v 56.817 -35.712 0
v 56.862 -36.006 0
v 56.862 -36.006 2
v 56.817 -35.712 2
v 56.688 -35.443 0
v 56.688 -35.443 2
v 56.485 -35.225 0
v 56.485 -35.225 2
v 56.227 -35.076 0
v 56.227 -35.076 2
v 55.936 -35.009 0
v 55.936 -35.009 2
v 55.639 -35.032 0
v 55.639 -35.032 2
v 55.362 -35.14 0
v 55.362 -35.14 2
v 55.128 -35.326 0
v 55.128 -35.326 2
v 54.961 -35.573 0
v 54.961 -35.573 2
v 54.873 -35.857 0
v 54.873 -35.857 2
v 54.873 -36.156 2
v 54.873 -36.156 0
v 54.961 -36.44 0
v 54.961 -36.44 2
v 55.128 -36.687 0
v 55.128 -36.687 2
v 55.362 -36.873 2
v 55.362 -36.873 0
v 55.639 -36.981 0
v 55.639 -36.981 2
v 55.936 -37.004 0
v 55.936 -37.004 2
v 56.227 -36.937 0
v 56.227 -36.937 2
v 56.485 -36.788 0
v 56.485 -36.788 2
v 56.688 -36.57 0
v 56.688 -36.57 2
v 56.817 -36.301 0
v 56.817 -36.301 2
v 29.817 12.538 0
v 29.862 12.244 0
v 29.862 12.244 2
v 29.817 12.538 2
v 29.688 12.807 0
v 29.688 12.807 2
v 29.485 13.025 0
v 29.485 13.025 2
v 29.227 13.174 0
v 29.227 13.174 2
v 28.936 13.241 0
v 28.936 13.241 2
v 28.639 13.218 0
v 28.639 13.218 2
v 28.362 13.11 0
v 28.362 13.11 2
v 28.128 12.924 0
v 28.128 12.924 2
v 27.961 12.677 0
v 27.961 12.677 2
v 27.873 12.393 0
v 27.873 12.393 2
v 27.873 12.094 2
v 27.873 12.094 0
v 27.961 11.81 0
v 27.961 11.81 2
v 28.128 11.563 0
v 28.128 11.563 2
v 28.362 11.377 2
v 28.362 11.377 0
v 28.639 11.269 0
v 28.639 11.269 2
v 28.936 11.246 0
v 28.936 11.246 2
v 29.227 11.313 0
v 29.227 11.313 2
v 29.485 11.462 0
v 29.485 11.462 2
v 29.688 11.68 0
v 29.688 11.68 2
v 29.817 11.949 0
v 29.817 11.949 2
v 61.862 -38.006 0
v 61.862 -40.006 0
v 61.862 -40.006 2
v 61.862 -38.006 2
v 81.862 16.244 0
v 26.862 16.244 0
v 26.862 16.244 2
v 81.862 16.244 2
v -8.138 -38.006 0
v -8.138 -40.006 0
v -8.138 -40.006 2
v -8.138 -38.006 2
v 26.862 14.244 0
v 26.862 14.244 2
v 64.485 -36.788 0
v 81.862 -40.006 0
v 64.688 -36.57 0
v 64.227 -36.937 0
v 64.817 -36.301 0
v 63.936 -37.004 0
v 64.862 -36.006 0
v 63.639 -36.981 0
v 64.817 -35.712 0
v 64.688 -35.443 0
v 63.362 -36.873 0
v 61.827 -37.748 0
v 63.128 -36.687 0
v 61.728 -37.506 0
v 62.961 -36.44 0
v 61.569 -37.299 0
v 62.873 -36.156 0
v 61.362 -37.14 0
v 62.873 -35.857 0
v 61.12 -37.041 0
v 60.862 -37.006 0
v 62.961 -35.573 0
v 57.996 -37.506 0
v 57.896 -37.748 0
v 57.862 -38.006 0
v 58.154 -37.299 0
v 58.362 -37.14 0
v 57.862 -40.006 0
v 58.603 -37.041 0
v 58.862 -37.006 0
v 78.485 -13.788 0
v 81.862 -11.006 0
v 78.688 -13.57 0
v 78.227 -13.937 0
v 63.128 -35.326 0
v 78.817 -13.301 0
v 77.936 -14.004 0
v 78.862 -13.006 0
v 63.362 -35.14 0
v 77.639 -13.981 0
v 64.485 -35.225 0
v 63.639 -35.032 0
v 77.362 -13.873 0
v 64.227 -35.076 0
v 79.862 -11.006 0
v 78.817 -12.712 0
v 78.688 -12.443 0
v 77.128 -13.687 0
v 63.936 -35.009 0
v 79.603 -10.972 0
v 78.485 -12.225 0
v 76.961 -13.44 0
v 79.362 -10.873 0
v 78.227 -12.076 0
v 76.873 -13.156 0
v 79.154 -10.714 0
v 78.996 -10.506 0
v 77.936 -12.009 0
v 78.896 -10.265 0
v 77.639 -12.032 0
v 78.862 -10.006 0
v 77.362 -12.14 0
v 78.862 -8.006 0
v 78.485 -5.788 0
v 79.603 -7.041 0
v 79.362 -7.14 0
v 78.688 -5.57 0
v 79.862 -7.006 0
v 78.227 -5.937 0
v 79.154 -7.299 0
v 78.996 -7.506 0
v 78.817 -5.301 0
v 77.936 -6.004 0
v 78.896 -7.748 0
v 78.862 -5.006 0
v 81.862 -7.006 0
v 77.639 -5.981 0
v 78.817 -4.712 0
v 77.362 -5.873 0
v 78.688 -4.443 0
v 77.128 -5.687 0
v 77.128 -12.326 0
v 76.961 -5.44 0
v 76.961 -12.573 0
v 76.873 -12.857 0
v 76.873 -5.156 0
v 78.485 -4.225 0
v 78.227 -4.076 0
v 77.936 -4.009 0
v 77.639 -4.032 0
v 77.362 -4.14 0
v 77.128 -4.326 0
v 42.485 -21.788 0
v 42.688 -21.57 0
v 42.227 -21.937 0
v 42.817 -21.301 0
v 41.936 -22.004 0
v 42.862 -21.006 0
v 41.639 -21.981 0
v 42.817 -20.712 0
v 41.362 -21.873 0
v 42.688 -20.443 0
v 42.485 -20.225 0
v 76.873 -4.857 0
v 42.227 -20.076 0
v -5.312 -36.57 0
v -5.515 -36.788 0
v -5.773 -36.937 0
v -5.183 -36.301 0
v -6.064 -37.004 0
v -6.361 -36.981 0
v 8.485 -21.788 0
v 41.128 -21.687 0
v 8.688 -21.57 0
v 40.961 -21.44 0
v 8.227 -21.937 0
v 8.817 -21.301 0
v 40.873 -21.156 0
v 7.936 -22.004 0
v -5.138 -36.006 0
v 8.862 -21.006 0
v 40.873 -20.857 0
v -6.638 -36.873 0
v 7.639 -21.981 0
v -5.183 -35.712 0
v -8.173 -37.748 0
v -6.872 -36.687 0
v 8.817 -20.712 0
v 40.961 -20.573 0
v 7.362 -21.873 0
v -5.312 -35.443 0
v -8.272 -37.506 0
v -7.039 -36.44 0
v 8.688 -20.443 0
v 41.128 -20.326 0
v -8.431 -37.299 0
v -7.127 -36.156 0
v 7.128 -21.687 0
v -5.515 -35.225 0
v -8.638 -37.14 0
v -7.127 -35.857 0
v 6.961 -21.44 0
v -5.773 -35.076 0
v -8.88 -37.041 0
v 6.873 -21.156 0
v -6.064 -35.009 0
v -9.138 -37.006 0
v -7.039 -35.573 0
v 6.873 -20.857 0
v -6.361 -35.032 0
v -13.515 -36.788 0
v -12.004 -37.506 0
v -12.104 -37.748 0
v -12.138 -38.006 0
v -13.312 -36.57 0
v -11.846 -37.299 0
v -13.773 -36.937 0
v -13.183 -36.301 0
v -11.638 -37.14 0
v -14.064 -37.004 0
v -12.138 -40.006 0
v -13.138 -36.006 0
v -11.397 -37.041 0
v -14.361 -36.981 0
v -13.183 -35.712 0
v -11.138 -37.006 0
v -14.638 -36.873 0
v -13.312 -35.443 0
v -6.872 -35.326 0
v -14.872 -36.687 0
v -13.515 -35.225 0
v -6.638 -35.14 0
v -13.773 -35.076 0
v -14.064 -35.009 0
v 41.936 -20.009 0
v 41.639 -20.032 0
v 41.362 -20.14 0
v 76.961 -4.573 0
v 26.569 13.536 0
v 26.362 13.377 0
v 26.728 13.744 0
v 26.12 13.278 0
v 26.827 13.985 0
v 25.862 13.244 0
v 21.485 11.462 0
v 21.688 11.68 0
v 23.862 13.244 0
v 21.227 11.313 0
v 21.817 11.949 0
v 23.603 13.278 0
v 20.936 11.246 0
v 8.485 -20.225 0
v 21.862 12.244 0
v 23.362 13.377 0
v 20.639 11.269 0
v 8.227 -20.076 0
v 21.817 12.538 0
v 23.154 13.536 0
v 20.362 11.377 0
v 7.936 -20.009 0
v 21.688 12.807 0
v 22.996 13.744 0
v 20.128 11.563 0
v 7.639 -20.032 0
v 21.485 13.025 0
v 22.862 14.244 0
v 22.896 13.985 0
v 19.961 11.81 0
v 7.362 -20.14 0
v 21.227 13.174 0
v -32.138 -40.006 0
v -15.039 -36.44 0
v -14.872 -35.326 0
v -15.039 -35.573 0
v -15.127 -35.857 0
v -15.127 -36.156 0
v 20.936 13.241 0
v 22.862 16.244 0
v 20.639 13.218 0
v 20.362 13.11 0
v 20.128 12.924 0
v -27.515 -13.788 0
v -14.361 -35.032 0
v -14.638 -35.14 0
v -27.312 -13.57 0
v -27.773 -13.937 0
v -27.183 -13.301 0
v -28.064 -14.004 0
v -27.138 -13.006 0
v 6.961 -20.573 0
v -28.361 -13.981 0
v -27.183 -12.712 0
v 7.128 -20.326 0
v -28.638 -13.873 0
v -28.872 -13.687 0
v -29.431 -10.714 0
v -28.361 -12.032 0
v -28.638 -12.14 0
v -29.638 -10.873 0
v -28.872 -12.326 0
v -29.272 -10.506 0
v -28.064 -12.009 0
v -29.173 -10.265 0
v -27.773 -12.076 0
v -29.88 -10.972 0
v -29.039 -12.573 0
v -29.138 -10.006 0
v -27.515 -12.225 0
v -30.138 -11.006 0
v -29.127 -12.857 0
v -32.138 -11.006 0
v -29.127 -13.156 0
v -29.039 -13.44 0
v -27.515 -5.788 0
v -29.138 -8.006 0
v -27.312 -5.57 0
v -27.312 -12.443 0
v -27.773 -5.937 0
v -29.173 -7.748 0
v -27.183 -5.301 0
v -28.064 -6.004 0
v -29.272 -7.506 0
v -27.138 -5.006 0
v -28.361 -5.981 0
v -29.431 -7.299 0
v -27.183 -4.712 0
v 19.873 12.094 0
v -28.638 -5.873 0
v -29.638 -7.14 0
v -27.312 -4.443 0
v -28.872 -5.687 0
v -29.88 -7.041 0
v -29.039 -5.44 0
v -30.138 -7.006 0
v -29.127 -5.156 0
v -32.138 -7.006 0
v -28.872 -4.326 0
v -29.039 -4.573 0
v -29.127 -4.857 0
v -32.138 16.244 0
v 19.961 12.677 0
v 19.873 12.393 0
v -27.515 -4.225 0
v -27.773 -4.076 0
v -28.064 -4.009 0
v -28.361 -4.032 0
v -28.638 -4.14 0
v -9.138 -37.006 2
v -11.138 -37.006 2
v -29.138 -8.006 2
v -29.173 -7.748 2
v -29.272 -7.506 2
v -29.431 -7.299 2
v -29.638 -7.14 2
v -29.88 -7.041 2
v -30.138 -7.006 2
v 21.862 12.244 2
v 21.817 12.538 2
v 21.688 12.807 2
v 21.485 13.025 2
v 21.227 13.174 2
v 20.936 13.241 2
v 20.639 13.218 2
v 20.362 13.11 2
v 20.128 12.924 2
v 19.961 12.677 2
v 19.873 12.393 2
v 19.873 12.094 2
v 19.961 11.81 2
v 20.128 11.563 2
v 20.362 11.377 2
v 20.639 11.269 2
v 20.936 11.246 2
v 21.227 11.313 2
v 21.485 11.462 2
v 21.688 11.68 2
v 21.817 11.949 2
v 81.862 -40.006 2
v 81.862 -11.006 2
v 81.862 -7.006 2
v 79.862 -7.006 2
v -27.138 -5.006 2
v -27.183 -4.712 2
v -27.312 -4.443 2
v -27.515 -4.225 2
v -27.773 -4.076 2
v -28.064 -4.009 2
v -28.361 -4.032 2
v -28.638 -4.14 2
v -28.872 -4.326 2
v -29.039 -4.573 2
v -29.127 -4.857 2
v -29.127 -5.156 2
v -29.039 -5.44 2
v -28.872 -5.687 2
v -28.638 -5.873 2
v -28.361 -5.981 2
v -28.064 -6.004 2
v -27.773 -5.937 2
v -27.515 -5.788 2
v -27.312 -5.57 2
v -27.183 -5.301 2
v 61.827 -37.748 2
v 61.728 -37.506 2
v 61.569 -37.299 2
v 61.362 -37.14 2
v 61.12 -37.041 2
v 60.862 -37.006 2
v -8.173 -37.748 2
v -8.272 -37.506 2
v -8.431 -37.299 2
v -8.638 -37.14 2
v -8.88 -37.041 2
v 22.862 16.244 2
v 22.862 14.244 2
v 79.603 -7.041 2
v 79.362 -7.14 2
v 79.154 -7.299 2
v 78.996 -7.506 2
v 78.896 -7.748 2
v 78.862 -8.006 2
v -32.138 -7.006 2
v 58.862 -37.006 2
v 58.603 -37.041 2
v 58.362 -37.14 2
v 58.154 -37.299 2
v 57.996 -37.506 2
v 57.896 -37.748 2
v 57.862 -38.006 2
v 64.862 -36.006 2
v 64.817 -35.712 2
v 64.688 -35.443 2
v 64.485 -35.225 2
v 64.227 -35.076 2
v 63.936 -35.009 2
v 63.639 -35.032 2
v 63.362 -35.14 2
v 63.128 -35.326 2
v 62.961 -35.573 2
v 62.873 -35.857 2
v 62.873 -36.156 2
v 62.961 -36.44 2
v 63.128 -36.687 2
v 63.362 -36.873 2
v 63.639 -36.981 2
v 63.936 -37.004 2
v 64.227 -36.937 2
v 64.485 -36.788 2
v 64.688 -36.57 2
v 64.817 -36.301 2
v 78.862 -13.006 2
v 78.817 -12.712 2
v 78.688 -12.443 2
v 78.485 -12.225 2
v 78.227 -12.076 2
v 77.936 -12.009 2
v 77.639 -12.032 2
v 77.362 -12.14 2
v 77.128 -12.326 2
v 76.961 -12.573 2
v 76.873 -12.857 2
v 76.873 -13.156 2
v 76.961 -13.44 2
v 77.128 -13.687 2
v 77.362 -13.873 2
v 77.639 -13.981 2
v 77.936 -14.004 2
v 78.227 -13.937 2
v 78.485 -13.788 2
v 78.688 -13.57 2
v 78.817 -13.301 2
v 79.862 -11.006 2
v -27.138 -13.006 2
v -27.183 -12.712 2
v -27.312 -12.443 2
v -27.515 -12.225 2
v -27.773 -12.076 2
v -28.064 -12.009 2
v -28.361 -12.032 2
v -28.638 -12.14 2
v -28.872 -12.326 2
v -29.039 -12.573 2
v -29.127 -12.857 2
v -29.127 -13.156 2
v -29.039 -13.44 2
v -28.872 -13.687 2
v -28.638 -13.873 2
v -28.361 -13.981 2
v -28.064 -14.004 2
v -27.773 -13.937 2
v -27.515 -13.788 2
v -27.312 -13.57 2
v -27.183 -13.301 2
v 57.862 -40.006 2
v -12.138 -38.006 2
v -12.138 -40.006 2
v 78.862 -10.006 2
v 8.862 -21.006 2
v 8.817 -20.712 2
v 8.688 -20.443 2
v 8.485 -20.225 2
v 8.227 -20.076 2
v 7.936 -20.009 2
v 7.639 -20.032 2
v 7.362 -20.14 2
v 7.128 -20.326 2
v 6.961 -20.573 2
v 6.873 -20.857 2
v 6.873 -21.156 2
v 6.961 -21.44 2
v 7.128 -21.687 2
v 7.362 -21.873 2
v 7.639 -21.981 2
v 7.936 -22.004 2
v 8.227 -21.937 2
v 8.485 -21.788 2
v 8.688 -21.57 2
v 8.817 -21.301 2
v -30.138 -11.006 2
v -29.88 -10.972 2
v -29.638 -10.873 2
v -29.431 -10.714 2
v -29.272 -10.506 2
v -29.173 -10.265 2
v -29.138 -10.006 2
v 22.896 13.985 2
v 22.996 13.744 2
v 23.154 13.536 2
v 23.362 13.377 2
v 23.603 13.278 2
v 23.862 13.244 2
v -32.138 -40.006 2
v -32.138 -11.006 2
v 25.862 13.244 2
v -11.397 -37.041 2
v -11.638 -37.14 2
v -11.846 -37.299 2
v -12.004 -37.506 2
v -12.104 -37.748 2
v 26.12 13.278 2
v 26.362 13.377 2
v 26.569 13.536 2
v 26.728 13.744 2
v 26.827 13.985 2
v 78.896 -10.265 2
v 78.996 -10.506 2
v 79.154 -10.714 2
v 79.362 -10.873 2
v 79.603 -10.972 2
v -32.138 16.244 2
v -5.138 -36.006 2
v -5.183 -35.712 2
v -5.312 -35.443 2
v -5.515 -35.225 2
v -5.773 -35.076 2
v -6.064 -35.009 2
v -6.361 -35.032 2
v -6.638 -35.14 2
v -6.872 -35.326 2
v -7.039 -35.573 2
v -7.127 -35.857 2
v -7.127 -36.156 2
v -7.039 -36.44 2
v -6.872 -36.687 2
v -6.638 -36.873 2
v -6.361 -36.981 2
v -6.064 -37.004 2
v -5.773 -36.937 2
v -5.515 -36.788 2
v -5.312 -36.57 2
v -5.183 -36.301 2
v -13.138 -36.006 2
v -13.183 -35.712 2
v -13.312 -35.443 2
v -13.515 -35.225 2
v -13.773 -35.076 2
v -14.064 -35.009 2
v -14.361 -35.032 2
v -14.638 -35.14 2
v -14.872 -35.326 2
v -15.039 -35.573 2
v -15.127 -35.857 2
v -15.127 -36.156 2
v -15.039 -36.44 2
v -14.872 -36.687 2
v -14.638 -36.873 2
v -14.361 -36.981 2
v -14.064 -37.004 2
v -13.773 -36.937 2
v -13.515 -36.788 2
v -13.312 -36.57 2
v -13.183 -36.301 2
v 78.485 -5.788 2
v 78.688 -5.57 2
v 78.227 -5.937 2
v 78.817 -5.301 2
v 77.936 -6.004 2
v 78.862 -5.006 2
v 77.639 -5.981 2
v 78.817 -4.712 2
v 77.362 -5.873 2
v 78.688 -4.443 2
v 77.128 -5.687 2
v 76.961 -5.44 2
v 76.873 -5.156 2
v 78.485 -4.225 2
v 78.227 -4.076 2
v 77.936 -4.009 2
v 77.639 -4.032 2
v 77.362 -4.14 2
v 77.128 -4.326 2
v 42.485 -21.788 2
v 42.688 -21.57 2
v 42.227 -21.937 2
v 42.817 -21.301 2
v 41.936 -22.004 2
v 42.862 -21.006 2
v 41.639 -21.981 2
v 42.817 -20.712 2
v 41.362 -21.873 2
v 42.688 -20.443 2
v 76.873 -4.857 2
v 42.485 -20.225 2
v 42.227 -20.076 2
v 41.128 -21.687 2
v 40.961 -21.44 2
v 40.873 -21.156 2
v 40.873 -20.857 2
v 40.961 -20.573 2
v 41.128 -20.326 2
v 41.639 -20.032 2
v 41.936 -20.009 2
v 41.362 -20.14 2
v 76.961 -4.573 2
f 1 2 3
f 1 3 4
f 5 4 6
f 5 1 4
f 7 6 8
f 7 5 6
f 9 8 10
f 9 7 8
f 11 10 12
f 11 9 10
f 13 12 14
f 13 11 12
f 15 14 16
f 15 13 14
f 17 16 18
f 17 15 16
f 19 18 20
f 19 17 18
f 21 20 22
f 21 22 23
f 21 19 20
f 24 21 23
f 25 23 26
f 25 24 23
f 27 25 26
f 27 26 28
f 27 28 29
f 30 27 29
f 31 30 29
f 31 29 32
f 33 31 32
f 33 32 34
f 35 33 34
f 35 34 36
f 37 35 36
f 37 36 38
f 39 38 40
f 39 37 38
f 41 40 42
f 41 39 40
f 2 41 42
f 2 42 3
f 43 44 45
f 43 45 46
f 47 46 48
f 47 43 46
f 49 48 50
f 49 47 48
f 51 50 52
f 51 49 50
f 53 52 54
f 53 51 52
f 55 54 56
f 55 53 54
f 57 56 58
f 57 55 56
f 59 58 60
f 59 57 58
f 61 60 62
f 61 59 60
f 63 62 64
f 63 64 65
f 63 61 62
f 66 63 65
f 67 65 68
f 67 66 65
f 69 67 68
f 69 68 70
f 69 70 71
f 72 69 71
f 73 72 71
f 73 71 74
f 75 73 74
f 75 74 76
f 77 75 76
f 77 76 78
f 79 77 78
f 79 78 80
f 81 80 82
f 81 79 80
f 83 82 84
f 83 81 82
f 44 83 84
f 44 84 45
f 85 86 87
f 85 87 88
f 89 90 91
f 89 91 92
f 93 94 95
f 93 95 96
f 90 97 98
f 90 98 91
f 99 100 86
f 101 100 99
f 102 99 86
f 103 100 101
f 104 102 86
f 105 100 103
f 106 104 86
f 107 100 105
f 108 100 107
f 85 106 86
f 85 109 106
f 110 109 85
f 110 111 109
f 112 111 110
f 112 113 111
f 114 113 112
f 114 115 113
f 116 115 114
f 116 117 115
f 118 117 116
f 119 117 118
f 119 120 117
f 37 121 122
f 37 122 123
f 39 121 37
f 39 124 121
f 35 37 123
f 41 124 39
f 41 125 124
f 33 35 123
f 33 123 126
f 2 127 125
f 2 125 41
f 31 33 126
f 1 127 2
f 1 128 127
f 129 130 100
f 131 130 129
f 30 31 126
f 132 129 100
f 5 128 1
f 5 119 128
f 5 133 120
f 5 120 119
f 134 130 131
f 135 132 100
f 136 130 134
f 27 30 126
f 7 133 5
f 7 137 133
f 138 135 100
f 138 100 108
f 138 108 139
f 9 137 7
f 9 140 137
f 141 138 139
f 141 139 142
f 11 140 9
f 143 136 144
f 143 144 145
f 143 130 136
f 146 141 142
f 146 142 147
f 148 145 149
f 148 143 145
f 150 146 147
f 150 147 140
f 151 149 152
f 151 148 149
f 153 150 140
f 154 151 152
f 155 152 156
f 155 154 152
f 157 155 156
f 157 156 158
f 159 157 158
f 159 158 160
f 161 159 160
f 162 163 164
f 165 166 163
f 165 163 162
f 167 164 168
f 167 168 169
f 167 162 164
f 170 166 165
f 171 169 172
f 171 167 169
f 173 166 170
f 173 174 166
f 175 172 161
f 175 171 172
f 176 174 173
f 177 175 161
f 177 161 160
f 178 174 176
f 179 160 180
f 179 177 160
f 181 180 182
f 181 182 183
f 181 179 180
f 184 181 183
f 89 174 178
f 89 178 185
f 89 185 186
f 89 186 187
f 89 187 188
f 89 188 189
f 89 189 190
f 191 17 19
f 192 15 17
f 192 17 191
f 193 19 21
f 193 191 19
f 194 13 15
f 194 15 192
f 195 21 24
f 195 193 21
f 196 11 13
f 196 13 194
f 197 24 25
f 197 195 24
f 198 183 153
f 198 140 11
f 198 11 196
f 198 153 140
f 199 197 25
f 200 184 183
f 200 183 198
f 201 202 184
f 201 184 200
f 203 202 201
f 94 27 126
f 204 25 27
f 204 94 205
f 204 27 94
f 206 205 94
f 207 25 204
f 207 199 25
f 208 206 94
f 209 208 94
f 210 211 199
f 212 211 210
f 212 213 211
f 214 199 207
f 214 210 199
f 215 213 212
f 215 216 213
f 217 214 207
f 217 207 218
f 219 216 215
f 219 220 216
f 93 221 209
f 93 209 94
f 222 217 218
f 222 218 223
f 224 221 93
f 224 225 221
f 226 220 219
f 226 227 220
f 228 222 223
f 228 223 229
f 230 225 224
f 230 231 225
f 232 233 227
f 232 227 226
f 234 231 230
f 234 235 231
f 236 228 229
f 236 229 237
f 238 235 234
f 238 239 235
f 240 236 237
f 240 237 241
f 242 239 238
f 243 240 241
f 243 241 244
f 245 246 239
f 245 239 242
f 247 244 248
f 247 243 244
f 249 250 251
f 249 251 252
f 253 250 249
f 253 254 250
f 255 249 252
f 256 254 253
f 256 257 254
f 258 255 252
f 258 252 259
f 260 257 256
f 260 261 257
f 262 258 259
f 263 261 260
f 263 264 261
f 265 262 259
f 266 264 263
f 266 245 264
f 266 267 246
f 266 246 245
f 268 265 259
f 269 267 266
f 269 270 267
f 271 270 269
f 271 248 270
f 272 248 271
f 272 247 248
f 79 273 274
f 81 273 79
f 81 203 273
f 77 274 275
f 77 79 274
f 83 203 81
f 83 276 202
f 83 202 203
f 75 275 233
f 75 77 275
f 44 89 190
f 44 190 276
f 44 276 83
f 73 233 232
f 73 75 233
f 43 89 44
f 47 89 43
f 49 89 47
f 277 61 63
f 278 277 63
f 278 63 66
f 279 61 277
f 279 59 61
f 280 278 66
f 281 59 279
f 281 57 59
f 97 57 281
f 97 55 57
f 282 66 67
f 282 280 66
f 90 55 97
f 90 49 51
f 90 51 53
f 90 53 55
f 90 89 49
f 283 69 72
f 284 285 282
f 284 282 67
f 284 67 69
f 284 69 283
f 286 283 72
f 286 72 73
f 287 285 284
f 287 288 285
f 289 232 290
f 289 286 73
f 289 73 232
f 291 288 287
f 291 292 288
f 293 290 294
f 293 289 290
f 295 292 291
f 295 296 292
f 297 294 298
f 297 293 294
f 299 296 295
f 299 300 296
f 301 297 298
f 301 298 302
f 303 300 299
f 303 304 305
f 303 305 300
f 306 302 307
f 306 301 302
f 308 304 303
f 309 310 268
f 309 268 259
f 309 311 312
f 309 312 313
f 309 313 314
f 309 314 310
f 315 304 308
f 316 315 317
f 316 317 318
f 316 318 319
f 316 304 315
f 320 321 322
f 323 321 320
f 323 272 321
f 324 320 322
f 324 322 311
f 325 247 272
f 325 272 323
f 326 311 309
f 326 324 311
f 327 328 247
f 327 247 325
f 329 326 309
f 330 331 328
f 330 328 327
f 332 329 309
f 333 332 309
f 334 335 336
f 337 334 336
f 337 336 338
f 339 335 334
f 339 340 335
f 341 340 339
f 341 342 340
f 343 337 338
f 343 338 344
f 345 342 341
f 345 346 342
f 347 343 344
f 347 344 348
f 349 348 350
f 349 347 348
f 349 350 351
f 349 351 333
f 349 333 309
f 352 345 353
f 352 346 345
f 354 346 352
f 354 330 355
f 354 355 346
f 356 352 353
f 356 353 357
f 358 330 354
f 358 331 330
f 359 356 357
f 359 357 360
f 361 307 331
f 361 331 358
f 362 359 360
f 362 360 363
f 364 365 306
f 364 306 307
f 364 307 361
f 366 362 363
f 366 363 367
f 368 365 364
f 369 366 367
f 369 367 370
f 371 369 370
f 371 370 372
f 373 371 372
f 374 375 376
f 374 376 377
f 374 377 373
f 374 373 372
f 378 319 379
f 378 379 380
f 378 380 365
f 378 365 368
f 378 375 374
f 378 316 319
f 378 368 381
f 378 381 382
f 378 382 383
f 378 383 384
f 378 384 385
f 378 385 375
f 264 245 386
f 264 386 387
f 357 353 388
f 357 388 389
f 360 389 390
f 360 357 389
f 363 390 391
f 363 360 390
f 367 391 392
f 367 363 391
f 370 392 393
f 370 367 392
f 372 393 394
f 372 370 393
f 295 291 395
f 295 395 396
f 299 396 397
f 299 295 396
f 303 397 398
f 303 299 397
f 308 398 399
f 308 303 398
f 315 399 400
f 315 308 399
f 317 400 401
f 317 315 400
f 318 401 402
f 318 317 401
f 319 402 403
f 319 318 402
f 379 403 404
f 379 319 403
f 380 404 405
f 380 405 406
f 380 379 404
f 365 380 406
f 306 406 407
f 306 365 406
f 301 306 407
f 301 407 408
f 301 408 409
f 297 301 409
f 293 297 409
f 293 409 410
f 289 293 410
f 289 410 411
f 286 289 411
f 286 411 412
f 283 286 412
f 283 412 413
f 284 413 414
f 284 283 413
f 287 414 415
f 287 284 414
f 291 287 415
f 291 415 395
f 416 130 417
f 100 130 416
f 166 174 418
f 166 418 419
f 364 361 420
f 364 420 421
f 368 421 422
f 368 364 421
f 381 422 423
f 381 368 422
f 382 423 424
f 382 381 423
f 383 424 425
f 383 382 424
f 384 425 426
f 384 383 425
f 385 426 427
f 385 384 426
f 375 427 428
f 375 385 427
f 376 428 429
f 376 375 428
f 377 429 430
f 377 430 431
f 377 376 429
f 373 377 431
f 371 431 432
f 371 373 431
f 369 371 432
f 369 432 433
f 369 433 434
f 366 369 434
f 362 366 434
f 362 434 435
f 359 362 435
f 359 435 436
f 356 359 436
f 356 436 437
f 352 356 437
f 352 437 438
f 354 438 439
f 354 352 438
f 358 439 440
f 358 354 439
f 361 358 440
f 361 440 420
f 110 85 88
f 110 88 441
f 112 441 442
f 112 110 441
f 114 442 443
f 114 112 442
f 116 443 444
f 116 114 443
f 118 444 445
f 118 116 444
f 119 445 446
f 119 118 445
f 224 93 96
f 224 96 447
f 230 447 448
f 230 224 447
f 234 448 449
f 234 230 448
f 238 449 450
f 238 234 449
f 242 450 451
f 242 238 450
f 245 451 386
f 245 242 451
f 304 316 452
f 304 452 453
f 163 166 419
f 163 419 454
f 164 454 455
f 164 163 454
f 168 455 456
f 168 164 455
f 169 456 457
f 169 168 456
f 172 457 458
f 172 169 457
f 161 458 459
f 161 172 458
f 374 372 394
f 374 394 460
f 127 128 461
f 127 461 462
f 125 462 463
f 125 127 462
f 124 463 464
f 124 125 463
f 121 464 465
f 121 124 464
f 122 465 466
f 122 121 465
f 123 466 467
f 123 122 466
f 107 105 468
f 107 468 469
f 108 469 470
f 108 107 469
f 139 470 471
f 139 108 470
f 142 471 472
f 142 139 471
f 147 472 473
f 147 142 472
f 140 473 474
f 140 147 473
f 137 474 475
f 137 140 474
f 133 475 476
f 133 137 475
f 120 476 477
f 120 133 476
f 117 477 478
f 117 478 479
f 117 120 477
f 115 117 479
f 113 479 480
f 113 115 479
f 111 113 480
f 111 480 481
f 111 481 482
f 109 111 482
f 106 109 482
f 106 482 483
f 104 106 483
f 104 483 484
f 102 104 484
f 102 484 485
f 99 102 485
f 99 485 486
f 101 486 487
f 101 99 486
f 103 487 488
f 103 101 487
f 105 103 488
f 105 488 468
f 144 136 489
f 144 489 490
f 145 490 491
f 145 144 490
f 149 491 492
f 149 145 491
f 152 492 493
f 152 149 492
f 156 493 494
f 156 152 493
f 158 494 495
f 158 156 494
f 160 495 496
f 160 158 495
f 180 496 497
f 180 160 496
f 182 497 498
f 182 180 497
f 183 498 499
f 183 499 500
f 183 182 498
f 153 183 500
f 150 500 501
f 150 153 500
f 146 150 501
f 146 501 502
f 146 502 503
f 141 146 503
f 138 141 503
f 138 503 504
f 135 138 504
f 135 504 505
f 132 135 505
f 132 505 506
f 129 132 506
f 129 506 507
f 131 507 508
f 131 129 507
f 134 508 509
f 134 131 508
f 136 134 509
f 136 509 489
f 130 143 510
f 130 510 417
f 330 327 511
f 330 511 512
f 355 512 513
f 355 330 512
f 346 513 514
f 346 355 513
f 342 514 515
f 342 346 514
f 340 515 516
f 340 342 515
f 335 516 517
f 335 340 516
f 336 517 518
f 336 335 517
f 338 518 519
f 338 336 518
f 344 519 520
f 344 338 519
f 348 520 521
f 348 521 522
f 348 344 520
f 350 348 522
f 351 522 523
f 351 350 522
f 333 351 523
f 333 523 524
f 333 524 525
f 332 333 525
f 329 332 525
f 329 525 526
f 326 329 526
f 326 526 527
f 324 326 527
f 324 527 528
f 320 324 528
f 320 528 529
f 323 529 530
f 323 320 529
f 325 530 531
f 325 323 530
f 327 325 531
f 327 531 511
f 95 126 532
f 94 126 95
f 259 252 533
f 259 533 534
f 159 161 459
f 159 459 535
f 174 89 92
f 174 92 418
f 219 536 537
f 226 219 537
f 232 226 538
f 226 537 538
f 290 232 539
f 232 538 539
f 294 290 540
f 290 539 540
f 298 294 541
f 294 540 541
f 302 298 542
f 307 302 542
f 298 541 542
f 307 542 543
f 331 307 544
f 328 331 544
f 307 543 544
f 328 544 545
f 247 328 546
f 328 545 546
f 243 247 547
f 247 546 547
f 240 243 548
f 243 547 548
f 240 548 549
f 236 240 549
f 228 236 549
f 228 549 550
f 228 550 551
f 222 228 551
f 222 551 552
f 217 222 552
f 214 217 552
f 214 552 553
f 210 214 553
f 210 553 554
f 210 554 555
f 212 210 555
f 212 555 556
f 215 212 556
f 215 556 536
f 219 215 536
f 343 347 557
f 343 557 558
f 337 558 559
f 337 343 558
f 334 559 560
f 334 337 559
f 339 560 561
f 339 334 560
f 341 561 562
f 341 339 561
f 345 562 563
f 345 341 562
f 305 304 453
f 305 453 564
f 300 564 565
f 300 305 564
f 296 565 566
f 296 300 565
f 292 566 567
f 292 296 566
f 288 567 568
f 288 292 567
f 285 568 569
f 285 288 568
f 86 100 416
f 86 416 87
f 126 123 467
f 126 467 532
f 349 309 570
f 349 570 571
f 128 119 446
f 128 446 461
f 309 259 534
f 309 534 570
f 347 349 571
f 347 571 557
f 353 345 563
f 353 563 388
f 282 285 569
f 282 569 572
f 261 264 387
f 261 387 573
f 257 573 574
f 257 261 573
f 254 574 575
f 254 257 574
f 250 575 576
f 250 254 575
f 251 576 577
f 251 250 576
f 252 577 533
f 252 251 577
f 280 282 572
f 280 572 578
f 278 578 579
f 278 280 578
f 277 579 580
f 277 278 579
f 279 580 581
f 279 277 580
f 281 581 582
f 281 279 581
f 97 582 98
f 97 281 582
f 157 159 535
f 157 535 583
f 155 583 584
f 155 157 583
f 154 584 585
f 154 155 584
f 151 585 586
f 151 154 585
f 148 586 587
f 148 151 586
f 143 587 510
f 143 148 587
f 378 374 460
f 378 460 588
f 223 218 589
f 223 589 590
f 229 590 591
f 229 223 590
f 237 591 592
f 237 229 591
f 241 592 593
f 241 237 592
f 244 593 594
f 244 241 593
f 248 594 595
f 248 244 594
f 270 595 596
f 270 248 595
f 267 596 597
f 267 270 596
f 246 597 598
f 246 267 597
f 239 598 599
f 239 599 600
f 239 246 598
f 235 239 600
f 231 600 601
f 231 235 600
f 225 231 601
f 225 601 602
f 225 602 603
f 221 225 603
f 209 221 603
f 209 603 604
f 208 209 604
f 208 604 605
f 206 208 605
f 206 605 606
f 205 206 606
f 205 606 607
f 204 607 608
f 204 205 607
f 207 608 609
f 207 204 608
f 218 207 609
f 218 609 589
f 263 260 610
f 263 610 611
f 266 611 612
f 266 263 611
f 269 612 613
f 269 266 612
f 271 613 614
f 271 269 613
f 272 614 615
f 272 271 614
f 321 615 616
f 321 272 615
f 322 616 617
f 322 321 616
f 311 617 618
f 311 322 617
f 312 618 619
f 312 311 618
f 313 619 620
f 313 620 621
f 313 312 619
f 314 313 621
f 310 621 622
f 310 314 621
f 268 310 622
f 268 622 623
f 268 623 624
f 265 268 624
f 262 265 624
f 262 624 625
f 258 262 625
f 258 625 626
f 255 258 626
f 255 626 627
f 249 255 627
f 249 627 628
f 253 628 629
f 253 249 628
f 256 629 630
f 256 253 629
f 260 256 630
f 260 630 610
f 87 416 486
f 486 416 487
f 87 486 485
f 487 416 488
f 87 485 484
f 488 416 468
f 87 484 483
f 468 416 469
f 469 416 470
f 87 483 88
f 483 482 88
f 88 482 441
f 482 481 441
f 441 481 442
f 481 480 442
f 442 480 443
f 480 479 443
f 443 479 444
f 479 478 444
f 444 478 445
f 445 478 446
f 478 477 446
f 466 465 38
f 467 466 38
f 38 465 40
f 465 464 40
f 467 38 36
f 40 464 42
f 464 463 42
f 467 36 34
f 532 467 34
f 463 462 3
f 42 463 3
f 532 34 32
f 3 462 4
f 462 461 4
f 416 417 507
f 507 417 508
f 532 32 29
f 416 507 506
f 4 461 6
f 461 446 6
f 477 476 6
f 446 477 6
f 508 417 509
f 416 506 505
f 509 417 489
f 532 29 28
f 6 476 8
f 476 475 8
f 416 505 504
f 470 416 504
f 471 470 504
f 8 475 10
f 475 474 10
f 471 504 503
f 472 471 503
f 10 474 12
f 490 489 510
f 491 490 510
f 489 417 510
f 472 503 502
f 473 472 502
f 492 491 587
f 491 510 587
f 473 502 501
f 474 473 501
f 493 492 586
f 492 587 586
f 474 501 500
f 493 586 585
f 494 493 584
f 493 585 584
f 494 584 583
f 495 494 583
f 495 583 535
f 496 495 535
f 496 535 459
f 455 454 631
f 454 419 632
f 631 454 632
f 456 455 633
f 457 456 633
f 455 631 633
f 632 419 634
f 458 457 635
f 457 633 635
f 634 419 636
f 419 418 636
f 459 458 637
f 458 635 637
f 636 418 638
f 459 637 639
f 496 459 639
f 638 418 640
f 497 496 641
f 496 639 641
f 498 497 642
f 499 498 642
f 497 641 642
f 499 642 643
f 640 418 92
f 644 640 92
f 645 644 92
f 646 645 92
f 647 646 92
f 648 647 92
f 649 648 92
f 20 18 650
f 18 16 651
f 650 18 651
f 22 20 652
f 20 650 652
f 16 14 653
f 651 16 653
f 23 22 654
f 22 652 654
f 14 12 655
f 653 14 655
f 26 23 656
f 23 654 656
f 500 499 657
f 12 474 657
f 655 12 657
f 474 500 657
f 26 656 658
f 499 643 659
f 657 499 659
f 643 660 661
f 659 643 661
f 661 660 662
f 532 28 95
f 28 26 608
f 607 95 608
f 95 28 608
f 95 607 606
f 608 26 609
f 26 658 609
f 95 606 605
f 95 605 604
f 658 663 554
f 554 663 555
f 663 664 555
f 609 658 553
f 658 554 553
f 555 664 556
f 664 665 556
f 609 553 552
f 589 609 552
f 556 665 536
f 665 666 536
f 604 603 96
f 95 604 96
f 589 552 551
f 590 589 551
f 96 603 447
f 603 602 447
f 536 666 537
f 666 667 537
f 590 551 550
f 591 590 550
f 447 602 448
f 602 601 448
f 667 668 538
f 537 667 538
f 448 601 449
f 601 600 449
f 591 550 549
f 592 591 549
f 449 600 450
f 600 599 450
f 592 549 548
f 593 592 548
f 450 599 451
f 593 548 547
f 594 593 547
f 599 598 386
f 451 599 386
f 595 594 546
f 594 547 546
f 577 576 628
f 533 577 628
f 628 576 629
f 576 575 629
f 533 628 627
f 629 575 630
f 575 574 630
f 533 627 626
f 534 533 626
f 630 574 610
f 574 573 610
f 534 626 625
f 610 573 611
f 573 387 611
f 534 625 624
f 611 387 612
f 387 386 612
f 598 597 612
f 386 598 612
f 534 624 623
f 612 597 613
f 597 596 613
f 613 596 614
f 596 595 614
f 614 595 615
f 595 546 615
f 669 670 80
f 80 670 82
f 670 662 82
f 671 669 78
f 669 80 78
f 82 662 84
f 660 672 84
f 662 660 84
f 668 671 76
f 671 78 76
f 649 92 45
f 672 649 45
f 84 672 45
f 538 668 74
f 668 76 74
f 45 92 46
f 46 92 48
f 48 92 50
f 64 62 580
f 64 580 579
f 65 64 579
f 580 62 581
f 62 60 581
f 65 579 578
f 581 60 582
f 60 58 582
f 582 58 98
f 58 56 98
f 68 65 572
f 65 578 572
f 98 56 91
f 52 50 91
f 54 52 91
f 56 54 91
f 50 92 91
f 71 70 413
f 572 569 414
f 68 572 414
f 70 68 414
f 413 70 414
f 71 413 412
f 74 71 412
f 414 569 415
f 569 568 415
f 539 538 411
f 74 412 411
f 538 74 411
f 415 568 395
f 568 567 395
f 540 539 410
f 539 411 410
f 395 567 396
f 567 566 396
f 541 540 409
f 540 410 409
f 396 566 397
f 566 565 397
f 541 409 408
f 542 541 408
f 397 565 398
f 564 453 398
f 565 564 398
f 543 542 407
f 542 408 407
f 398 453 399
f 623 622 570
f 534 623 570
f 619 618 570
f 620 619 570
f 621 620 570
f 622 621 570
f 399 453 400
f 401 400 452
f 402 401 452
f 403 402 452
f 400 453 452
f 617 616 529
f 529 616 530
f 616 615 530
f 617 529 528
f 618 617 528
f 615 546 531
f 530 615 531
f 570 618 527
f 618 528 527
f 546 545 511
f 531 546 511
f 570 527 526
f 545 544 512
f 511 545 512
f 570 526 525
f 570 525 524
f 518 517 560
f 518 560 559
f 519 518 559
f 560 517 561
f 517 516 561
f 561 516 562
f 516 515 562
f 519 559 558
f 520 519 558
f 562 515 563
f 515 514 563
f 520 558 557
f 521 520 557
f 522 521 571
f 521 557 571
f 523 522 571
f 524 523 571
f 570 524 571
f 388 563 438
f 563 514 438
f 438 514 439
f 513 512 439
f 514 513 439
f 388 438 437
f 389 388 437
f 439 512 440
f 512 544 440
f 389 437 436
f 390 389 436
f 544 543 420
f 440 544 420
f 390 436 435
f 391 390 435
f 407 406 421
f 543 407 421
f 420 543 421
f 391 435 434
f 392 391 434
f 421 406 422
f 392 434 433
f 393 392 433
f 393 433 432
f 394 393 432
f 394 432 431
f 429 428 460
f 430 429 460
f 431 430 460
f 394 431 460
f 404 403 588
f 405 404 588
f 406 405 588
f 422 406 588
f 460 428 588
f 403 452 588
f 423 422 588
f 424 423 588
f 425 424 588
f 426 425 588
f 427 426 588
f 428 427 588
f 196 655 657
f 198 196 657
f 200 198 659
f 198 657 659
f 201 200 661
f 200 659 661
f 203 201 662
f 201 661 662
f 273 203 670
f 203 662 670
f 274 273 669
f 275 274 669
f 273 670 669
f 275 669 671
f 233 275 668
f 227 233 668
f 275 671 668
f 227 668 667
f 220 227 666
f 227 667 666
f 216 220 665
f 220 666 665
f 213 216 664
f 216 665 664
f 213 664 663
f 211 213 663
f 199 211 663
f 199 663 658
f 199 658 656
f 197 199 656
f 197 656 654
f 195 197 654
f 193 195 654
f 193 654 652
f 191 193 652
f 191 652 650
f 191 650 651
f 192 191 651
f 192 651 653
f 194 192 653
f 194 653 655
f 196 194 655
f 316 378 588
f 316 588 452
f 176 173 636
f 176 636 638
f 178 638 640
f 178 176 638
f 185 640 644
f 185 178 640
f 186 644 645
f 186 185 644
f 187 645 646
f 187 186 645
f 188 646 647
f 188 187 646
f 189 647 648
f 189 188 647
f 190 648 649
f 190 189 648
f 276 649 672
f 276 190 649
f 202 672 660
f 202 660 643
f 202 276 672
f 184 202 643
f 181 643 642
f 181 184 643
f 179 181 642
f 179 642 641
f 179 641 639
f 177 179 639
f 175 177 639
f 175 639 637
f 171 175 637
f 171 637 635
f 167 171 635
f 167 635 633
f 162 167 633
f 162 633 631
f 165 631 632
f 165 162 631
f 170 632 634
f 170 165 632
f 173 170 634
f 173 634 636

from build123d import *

# Parameters (mm, degrees)
SKETCH_1_R          = 1
EXTRUDE_1_DEPTH     = 2
SKETCH_2_R          = 1
CUT_EXTRUDE_1_DEPTH = 10


with BuildPart() as part:
    # 草圖1 → 填料-伸長1 (new body)
    with BuildSketch(Plane.XY):
        with BuildLine():
            Line((23.861531606, 13.243524775), (25.861531606, 13.243524775))
            ThreePointArc((25.861531606, 13.243524775), (26.568638387, 13.536417994), (26.861531606, 14.243524775))
            Line((26.861531606, 14.243524775), (26.861531606, 16.243524775))
            Line((26.861531606, 16.243524775), (80.861531606, 16.243524775))
            Line((80.861531606, 16.243524775), (81.861531606, 16.243524775))
            Line((81.861531606, 16.243524775), (81.861531606, 15.243524775))
            Line((81.861531606, 15.243524775), (81.861531606, -7.006475225))
            Line((81.861531606, -7.006475225), (79.861531606, -7.006475225))
            ThreePointArc((79.861531606, -7.006475225), (79.154424825, -7.299368444), (78.861531606, -8.006475225))
            Line((78.861531606, -8.006475225), (78.861531606, -10.006475225))
            ThreePointArc((78.861531606, -10.006475225), (79.154424825, -10.713582006), (79.861531606, -11.006475225))
            Line((79.861531606, -11.006475225), (81.861531606, -11.006475225))
            Line((81.861531606, -11.006475225), (81.861531606, -39.006475225))
            Line((81.861531606, -39.006475225), (81.861531606, -40.006475225))
            Line((81.861531606, -40.006475225), (80.861531606, -40.006475225))
            Line((80.861531606, -40.006475225), (61.861531606, -40.006475225))
            Line((61.861531606, -40.006475225), (61.861531606, -38.006475225))
            ThreePointArc((61.861531606, -38.006475225), (61.568638387, -37.299368444), (60.861531606, -37.006475225))
            Line((60.861531606, -37.006475225), (58.861531606, -37.006475225))
            ThreePointArc((58.861531606, -37.006475225), (58.154424825, -37.299368444), (57.861531606, -38.006475225))
            Line((57.861531606, -38.006475225), (57.861531606, -40.006475225))
            Line((57.861531606, -40.006475225), (-8.138468394, -40.006475225))
            Line((-8.138468394, -40.006475225), (-8.138468394, -38.006475225))
            ThreePointArc((-8.138468394, -38.006475225), (-8.431361613, -37.299368444), (-9.138468394, -37.006475225))
            Line((-9.138468394, -37.006475225), (-11.138468394, -37.006475225))
            ThreePointArc((-11.138468394, -37.006475225), (-11.845575175, -37.299368444), (-12.138468394, -38.006475225))
            Line((-12.138468394, -38.006475225), (-12.138468394, -40.006475225))
            Line((-12.138468394, -40.006475225), (-31.138468394, -40.006475225))
            Line((-31.138468394, -40.006475225), (-32.138468394, -40.006475225))
            Line((-32.138468394, -40.006475225), (-32.138468394, -39.006475225))
            Line((-32.138468394, -39.006475225), (-32.138468394, -11.006475225))
            Line((-32.138468394, -11.006475225), (-30.138468394, -11.006475225))
            ThreePointArc((-30.138468394, -11.006475225), (-29.431361613, -10.713582006), (-29.138468394, -10.006475225))
            Line((-29.138468394, -10.006475225), (-29.138468394, -8.006475225))
            ThreePointArc((-29.138468394, -8.006475225), (-29.431361613, -7.299368444), (-30.138468394, -7.006475225))
            Line((-30.138468394, -7.006475225), (-32.138468394, -7.006475225))
            Line((-32.138468394, -7.006475225), (-32.138468394, 15.243524775))
            Line((-32.138468394, 15.243524775), (-32.138468394, 16.243524775))
            Line((-32.138468394, 16.243524775), (-31.138468394, 16.243524775))
            Line((-31.138468394, 16.243524775), (22.861531606, 16.243524775))
            Line((22.861531606, 16.243524775), (22.861531606, 14.243524775))
            ThreePointArc((22.861531606, 14.243524775), (23.154424825, 13.536417994), (23.861531606, 13.243524775))
        make_face()
        with Locations((55.861531606, -36.006475225)):
            Circle(SKETCH_1_R, mode=Mode.SUBTRACT)
        with Locations((77.861531606, -5.006475225)):
            Circle(SKETCH_1_R, mode=Mode.SUBTRACT)
        with Locations((-6.138468394, -36.006475225)):
            Circle(SKETCH_1_R, mode=Mode.SUBTRACT)
        with Locations((28.861531606, 12.243524775)):
            Circle(SKETCH_1_R, mode=Mode.SUBTRACT)
        with Locations((20.861531606, 12.243524775)):
            Circle(SKETCH_1_R, mode=Mode.SUBTRACT)
        with Locations((-28.138468394, -5.006475225)):
            Circle(SKETCH_1_R, mode=Mode.SUBTRACT)
        with Locations((-28.138468394, -13.006475225)):
            Circle(SKETCH_1_R, mode=Mode.SUBTRACT)
        with Locations((77.861531606, -13.006475225)):
            Circle(SKETCH_1_R, mode=Mode.SUBTRACT)
        with Locations((-14.138468394, -36.006475225)):
            Circle(SKETCH_1_R, mode=Mode.SUBTRACT)
        with Locations((63.861531606, -36.006475225)):
            Circle(SKETCH_1_R, mode=Mode.SUBTRACT)
    extrude(amount=EXTRUDE_1_DEPTH)

    # 草圖2 → 除料-伸長1 (cut)
    with BuildSketch(Plane.XY.offset(2)):
        with Locations((7.861531606, -21.006475225)):
            Circle(SKETCH_2_R)
        with Locations((41.861531606, -21.006475225)):
            Circle(SKETCH_2_R)
    extrude(amount=-CUT_EXTRUDE_1_DEPTH, mode=Mode.SUBTRACT)


solid = part.part
